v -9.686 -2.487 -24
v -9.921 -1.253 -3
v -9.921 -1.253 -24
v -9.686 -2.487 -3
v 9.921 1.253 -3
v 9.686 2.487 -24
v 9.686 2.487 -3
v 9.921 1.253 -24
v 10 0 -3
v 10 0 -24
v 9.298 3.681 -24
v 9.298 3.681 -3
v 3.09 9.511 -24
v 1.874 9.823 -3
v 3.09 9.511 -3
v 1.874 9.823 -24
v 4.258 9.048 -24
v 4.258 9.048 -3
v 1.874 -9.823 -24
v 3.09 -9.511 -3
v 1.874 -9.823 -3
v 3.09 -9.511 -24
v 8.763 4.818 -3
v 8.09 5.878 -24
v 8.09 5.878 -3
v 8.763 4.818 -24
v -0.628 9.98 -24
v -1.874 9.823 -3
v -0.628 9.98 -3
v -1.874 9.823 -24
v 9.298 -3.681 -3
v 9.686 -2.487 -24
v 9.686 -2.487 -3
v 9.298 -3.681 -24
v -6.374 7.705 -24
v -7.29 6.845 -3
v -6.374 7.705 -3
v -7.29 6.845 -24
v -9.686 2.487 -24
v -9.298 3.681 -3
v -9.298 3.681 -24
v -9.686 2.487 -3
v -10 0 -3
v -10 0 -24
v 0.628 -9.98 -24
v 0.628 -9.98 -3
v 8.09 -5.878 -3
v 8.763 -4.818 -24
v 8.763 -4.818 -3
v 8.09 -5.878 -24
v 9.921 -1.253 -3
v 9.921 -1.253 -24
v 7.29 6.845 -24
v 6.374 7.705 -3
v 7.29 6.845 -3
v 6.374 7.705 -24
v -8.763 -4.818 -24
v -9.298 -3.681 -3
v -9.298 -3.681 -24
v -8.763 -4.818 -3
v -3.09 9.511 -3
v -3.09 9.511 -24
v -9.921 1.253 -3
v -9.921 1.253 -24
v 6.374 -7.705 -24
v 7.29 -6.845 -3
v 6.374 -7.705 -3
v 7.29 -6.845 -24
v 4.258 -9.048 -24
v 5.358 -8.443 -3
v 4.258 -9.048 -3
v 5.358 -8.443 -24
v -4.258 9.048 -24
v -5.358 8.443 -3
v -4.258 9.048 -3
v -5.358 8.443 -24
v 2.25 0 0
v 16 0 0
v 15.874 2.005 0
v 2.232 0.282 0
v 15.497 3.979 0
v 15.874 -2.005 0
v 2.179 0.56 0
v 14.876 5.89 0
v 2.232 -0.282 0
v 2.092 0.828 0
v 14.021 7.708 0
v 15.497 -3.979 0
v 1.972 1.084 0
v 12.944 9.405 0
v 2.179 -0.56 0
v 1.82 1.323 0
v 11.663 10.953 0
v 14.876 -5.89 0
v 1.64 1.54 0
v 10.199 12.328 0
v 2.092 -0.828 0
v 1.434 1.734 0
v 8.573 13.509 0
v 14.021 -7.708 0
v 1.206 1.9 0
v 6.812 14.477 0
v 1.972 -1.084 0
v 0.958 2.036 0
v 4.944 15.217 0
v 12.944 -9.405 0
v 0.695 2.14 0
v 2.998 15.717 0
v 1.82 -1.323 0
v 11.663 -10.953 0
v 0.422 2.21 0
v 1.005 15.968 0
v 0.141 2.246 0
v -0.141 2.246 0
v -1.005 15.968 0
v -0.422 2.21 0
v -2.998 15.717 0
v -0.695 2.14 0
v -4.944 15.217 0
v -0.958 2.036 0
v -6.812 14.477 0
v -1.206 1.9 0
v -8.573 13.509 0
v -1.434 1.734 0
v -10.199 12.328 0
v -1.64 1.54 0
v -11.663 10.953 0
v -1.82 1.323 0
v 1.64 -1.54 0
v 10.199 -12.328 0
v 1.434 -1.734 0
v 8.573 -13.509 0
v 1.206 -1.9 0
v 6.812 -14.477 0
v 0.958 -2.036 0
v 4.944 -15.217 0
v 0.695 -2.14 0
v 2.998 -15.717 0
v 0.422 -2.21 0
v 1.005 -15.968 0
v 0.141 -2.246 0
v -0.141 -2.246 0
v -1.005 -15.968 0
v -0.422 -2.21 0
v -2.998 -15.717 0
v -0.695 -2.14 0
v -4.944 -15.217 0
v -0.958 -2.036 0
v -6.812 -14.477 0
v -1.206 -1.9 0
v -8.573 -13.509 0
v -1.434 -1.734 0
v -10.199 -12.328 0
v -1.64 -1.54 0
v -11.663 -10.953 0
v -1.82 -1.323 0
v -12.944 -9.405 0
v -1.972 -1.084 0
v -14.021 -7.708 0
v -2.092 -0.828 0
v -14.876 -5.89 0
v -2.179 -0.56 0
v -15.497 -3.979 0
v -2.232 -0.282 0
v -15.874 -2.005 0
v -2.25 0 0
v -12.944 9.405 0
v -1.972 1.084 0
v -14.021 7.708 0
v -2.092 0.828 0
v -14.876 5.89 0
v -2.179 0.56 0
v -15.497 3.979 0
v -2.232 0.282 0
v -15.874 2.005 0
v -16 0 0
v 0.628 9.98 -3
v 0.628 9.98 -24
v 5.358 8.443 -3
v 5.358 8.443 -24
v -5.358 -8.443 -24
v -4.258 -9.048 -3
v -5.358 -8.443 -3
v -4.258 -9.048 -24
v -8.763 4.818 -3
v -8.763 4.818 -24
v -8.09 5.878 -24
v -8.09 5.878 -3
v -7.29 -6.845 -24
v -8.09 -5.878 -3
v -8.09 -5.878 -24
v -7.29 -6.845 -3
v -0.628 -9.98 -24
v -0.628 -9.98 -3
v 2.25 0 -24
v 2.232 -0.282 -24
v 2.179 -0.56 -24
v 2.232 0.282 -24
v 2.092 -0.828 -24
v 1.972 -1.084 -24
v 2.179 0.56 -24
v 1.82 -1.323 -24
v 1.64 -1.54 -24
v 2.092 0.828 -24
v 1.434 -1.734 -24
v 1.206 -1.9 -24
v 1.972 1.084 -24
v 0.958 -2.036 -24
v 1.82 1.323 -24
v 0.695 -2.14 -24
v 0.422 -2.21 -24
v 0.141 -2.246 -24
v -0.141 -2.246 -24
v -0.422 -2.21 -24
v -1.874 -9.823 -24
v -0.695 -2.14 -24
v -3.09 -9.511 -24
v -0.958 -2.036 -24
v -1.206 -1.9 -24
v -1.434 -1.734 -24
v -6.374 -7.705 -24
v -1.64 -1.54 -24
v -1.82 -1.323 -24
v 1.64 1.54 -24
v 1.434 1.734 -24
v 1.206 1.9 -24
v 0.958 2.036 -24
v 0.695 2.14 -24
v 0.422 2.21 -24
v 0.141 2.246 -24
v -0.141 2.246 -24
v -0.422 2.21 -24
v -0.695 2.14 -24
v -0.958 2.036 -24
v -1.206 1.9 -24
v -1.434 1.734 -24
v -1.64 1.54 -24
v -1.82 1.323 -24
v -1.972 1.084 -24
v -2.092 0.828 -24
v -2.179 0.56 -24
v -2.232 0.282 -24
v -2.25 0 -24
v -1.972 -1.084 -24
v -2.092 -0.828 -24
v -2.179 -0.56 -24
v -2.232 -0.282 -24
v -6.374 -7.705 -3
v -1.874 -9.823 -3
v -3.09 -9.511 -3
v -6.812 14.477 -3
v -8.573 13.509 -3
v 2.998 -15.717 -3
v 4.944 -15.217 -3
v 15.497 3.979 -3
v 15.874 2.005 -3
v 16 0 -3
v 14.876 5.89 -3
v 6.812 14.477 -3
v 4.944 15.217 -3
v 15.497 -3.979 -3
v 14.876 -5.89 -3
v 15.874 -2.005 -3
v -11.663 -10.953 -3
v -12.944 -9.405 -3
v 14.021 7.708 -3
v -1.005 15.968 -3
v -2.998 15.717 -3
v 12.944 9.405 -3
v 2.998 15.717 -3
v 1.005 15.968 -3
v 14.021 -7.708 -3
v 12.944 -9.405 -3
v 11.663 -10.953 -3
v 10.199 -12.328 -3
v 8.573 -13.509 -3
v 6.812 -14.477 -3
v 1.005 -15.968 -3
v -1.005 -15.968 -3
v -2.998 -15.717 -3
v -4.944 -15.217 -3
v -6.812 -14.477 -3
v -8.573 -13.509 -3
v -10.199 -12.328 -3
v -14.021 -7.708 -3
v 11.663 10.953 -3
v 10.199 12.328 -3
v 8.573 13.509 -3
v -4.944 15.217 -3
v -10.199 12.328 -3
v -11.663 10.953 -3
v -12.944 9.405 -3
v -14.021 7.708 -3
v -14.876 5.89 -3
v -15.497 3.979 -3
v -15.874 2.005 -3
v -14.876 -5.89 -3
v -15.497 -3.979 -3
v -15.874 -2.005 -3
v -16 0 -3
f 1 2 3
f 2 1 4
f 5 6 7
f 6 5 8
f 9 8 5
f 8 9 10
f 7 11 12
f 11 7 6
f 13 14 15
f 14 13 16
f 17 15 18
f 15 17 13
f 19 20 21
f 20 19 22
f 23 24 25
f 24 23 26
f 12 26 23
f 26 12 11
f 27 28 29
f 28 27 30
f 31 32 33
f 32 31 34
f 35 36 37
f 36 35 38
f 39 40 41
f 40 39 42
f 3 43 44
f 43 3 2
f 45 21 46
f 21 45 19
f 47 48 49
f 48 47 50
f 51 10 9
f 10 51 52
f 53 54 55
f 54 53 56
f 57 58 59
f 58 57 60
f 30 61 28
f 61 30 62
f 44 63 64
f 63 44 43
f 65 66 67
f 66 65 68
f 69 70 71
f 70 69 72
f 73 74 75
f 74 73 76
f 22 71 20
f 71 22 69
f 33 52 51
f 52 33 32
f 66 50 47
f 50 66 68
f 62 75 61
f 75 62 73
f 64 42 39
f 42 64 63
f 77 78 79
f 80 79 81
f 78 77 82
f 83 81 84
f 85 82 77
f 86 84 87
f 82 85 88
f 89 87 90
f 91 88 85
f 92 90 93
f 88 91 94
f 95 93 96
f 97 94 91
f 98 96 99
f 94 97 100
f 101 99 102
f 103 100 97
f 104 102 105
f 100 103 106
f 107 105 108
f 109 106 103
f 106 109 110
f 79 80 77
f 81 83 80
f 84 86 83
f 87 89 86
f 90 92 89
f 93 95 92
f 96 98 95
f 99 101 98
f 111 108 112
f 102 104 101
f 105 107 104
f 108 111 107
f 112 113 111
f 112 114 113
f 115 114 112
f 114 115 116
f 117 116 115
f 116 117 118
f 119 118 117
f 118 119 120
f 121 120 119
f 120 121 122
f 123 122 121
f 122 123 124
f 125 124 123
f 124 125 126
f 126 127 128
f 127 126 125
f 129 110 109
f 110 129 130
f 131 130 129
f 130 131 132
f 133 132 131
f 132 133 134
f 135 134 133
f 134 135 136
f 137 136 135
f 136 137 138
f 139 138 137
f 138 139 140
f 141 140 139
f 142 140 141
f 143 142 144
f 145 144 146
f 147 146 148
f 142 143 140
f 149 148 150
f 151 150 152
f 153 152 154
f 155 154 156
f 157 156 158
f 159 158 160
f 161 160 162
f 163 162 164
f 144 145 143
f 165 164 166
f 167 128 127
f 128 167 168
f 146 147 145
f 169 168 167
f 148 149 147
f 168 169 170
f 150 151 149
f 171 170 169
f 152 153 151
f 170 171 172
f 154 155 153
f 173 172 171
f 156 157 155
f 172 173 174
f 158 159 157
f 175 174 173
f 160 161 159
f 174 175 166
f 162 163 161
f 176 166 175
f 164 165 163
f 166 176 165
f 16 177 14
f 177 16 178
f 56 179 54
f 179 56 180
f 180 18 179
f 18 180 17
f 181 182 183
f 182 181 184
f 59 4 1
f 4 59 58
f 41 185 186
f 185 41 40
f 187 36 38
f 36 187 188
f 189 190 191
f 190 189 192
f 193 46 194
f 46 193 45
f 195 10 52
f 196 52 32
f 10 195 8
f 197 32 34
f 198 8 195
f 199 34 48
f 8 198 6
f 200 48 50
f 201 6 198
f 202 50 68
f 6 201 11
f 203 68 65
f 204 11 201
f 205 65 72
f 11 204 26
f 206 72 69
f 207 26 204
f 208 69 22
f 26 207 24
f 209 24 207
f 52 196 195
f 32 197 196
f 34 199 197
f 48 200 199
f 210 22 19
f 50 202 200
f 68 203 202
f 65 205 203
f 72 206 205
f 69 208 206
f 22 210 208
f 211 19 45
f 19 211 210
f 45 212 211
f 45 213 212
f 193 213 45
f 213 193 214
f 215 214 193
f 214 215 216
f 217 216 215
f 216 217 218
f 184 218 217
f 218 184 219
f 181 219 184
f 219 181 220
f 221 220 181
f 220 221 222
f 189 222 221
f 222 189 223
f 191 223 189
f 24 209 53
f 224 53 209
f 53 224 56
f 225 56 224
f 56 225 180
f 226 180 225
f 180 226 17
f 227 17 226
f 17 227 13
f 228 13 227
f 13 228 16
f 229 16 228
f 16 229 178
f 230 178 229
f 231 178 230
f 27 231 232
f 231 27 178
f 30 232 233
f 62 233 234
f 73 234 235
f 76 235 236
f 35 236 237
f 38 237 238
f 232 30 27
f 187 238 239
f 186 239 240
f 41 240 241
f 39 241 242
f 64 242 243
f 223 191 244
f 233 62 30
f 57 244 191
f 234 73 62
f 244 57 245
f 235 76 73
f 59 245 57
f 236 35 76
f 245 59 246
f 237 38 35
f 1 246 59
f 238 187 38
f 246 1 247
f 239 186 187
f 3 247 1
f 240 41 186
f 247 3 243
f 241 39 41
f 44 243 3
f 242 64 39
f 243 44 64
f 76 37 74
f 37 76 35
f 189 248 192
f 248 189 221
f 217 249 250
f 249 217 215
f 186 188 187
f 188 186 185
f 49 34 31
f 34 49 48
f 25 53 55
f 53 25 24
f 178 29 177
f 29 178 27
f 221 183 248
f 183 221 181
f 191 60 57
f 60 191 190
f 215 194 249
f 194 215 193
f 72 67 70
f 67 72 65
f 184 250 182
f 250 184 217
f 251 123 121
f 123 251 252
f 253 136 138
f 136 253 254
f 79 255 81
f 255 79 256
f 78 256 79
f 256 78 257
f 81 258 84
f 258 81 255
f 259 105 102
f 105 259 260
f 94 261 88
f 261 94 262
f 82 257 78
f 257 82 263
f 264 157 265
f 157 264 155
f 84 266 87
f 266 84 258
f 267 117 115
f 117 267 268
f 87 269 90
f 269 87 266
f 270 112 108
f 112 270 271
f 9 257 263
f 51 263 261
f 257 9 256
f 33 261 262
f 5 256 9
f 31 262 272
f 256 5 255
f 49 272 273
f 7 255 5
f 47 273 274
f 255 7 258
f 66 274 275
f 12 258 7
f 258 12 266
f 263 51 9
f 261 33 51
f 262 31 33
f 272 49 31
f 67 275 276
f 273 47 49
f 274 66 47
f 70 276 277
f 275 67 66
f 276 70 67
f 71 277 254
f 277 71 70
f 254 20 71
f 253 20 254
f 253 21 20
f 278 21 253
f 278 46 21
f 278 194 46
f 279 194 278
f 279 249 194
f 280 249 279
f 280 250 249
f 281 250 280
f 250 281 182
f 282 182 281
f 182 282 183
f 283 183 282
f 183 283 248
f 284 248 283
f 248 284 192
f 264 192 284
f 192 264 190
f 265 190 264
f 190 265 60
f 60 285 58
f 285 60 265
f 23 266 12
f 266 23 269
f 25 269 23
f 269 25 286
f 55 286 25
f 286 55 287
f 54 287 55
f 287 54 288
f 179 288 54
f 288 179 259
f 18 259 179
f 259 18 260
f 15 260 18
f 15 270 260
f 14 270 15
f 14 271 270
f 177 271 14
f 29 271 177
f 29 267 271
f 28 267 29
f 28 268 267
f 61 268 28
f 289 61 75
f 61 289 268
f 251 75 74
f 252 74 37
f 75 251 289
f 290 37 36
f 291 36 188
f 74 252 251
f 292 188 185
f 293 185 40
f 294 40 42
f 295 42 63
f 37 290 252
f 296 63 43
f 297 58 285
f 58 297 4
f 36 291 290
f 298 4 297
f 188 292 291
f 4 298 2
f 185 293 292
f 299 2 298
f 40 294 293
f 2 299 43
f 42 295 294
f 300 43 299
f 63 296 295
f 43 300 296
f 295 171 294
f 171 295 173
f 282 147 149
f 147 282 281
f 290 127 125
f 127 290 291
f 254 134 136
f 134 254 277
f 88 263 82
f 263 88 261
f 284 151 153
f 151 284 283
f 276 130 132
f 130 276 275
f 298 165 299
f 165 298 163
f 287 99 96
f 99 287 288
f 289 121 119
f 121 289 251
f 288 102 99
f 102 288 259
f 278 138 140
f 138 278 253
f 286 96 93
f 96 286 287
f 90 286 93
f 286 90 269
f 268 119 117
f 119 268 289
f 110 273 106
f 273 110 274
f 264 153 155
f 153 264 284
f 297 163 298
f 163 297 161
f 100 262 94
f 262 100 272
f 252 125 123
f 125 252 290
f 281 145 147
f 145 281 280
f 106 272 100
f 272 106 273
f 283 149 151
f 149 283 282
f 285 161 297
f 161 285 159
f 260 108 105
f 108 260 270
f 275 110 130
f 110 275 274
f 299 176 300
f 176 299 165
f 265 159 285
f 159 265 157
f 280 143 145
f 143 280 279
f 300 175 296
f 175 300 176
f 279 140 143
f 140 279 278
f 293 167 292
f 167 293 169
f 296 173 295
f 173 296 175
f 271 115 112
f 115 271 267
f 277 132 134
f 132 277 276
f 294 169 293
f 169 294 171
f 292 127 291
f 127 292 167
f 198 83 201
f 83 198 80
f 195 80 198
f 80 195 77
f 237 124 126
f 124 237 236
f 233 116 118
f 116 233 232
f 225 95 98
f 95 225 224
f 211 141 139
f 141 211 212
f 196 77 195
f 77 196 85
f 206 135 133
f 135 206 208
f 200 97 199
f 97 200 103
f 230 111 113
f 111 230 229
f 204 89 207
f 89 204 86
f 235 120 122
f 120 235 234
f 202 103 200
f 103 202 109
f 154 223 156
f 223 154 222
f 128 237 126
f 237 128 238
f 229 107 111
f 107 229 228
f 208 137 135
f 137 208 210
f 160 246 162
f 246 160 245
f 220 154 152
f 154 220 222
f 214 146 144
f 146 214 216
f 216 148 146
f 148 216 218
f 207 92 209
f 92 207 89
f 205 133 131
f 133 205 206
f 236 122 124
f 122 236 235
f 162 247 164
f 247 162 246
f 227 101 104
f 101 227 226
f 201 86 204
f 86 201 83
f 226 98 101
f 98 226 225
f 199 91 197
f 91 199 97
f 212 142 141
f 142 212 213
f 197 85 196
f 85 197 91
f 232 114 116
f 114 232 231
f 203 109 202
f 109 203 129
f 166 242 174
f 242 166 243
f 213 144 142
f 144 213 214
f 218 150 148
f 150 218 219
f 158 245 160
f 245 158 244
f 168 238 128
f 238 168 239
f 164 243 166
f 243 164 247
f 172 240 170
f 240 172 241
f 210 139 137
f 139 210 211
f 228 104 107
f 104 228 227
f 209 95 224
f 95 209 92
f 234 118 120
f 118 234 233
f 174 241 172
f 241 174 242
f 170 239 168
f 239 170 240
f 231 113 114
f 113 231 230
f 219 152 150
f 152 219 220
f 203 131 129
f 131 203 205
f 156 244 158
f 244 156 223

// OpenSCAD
$fn = 50;


difference() {
	union() {
		translate(v = [0, 0, -24.0000000000]) {
			cylinder(h = 24, r = 10.0000000000);
		}
		translate(v = [0, 0, -3.0000000000]) {
			cylinder(h = 3, r = 16.0000000000);
		}
	}
	union() {
		#translate(v = [0, 0, -24]) {
			cylinder(h = 24, r = 2.2500000000);
		}
	}
}
